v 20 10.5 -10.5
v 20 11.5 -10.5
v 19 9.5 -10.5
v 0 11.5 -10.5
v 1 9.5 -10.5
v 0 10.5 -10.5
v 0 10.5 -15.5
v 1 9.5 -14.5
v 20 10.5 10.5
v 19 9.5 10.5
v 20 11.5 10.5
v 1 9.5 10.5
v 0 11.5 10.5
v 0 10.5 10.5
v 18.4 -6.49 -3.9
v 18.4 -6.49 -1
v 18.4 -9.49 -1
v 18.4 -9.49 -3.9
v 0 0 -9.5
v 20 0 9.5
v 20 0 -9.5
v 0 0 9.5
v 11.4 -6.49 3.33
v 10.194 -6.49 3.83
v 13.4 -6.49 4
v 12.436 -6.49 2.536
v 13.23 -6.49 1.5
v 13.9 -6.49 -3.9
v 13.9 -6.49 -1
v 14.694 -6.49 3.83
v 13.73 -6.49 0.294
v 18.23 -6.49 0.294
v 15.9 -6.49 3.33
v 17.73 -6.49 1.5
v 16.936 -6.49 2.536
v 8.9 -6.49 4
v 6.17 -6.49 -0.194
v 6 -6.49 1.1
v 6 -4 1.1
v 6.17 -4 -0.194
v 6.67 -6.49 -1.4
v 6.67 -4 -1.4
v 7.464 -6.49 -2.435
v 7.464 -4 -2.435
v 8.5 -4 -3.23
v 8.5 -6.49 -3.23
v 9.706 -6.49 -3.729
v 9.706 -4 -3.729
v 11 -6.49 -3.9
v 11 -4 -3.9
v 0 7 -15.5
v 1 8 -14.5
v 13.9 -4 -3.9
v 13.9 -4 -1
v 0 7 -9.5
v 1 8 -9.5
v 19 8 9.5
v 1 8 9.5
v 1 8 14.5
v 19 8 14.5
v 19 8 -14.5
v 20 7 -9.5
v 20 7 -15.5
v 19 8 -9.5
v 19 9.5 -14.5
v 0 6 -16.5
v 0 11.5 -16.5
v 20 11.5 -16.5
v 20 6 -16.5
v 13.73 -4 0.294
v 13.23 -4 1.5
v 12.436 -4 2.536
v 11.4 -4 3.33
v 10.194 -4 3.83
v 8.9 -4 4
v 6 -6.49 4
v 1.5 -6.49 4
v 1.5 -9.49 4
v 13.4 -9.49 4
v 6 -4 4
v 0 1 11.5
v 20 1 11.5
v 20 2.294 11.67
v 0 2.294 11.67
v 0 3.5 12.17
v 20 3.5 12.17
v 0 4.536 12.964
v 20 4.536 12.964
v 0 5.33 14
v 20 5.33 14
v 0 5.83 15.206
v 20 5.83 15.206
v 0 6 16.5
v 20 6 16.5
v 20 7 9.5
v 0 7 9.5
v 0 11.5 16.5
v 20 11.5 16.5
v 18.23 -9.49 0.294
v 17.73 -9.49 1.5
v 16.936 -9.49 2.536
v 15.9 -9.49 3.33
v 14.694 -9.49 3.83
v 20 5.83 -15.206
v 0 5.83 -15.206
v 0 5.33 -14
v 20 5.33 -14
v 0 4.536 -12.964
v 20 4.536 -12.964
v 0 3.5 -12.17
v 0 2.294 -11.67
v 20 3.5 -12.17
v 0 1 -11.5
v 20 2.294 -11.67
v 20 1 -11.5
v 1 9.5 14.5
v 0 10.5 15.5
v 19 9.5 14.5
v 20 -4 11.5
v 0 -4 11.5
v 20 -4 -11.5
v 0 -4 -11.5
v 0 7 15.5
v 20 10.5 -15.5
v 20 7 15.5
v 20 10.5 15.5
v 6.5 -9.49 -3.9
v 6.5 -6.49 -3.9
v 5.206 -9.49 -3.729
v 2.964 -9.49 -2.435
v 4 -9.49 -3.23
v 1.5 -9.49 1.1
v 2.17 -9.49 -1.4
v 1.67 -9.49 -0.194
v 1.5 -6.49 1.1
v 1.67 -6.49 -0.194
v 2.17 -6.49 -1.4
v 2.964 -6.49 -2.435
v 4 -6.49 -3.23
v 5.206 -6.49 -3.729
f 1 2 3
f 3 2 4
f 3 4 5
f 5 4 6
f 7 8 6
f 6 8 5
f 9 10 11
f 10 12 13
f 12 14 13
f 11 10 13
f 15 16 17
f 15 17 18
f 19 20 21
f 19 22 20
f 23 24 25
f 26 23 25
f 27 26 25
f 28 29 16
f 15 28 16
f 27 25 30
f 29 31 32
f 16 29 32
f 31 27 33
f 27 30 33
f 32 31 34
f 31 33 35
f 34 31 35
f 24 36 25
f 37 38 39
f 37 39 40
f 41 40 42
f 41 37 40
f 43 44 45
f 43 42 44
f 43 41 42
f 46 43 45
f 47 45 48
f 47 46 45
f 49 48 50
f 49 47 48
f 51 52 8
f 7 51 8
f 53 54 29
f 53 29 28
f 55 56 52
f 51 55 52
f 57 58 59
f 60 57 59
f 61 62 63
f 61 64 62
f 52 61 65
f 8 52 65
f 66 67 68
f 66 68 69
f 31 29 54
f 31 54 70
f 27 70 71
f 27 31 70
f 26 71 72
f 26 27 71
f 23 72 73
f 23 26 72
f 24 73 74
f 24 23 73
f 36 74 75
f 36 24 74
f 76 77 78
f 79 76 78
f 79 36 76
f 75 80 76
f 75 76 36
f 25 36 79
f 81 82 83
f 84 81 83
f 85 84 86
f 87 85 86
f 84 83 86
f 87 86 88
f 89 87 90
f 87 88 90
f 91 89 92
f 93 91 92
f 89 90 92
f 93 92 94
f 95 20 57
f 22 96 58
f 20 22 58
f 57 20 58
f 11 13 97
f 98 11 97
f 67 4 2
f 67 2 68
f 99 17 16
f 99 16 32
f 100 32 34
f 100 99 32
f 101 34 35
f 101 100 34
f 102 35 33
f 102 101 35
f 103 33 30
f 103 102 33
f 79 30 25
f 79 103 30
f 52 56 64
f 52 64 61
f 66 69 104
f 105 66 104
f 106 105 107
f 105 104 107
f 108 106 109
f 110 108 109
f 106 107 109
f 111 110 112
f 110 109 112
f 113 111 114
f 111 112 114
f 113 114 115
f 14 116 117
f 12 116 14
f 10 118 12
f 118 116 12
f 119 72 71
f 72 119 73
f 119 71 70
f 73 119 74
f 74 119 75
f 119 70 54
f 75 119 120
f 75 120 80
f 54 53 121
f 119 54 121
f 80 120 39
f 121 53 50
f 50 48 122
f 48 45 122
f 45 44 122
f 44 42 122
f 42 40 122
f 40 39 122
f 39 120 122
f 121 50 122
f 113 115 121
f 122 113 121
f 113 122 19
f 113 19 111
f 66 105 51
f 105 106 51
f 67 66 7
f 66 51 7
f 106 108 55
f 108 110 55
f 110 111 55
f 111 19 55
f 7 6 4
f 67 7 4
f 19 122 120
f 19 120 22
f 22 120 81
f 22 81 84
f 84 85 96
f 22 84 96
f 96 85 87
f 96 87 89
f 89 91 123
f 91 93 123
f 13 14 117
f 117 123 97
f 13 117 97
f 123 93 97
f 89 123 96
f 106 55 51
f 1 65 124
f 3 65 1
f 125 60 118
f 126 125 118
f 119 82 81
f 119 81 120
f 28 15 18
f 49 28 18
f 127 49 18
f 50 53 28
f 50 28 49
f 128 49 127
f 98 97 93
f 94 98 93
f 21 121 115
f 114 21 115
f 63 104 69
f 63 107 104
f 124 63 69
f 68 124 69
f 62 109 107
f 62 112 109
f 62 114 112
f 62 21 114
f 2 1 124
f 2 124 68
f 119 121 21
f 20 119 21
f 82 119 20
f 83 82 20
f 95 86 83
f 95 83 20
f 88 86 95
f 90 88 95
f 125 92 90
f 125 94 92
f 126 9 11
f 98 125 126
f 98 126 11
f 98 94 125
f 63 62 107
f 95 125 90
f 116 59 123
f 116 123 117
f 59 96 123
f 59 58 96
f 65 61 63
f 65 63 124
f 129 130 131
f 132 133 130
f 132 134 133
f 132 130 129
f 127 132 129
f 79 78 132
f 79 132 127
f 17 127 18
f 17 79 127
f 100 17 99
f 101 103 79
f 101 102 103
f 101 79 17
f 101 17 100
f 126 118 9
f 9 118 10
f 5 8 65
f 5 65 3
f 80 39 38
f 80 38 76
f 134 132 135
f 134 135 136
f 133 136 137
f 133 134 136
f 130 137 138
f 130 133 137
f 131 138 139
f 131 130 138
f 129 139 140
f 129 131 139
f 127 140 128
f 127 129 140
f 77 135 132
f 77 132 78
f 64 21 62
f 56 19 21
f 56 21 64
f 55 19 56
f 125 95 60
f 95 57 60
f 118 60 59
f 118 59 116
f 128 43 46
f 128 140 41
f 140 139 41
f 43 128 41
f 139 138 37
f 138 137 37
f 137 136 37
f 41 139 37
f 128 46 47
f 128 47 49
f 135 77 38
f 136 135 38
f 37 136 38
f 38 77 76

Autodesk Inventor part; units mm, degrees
ref_plane "YZ Plane" through (0, 0, 0) normal (1, 0, 0) x (0, 1, 0)
ref_plane "XZ Plane" through (0, 0, 0) normal (0, 1, 0) x (-1, 0, 0)
ref_plane "XY Plane" through (0, 0, 0) normal (0, 0, 1) x (1, 0, 0)
sketch "Sketch1" plane through (0, 0, 0) normal (1, 0, 0) x (0, 1, 0)
  line L0 (0, 9.5) -> (0, -9.5)
  line L1 (0, -9.5) -> (8, -9.5)
  line L2 (0, 9.5) -> (8, 9.5)
  line L3 (8, 9.5) -> (8, 14.5)
  line L4 (8, 14.5) -> (9.5, 14.5)
  line L5 (9.5, 14.5) -> (9.5, 10.5)
  line L6 (9.5, 10.5) -> (11.5, 10.5)
  line L7 (11.5, 10.5) -> (11.5, 16.5)
  line L8 (11.5, 16.5) -> (6, 16.5)
  line L9 (6, 16.5) -> (6, 11.5)
  line L10 (6, 11.5) -> (-3, 11.5)
  line L11 (-3, 11.5) -> (-4, 11.5)
  line L12 (-4, 11.5) -> (-4, 1)
  line L13 (0, 0) -> (3.5, 0)
  line L14 (0, -9.5) -> (8, -9.5)
  line L15 (8, -9.5) -> (8, -14.5)
  line L16 (8, -14.5) -> (9.5, -14.5)
  line L17 (9.5, -14.5) -> (9.5, -10.5)
  line L18 (11.5, -10.5) -> (11.5, -16.5)
  line L19 (11.5, -16.5) -> (6, -16.5)
  line L20 (6, -16.5) -> (6, -11.5)
  line L21 (6, -11.5) -> (-3, -11.5)
  line L22 (-3, -11.5) -> (-4, -11.5)
  line L23 (-4, -11.5) -> (-4, 1)
  line L24 (11.5, -10.5) -> (9.5, -10.5)
  point P0 (8.75, -16.5)
  point P1 (8.75, -14.5)
  dimension "d0" = 19
  dimension "d1" = 0
  dimension "d2" = 8
  dimension "d3" = 8
  dimension "d4" = 5
  dimension "d5" = 1.5
  dimension "d6" = 2
  dimension "d7" = 6
  dimension "d8" = 5.5
  dimension "d9" = 5
  dimension "d10" = 1
  dimension "d13" = 2
  dimension "d14" = 4
extrude "Extrusion1" add sketch "Sketch1" along normal blind 20
fillet "Fillet1" radius 5 2 edges at (10, 6, -11.5) (10, 6, 11.5)
chamfer "Chamfer1" distance 1 angle 45 12 edges at (20, 8, -12) (20, 8.75, -14.5) (20, 9.5, -12.5) (20, 8, 12) (20, 8.75, 14.5) (20, 9.5, 12.5) (0, 8, -12) (0, 8.75, -14.5) (0, 9.5, -12.5) (0, 8, 12) (0, 8.75, 14.5) (0, 9.5, 12.5)
sketch "Sketch3" plane through (0, -4, -11.5) normal (0, -1, 0) x (1, 0, 0)
  line L0 (6, 15.5002) -> (13.9, 15.5002)
  line L1 (13.9, 15.5002) -> (13.9, 7.6002)
  line L2 (13.9, 7.6002) -> (6, 7.6002)
  line L3 (6, 7.6002) -> (6, 15.5002)
  line L4 (0, 23) -> (0, 0) projected
  line L5 (0, 23) -> (20, 23) projected
  point P0 (0, 11.5)
  point P1 (10, 23)
  point P2 (9.95, 15.5002)
  dimension "d27" = 7.9
  dimension "d28" = 7.9
  dimension "d29" = 6
  dimension "d30" = 7.5
extrude "Extrusion3" add sketch "Sketch3" along normal blind 2.49
sketch "Sketch4" plane through (0, -6.49, -11.5) normal (0, -1, 0) x (1, 0, 0)
  line L0 (1.5, 15.5002) -> (18.4, 15.5002)
  line L1 (18.4, 15.5002) -> (18.4, 7.6002)
  line L2 (18.4, 7.6002) -> (1.5, 7.6002)
  line L3 (1.5, 7.6002) -> (1.5, 15.5002)
  line L4 (1.5, 15.5002) -> (18.4, 7.6002) construction
  line L5 (18.4, 15.5002) -> (1.5, 7.6002) construction
  line L6 (6, 7.6002) -> (13.9, 7.6002) projected
  line L7 (13.9, 7.6002) -> (13.9, 15.5002) projected
  point P0 (0, 11.5)
  point P1 (9.95, 11.5502)
  dimension "d33" = 16.9
  dimension "d34" = 7.9
  dimension "d35" = 0
  dimension "d36" = 4.5
extrude "Extrusion4" add sketch "Sketch4" along normal blind 3
fillet "Fillet2" radius 5 4 edges at (6, -5.245, -3.8998) (1.5, -7.99, -3.8998) (13.9, -5.245, 4.0002) (18.4, -7.99, 4.0002)
sketch "Sketch2" plane through (0, 0, 9.5) normal (0, 1, 0) x (1, 0, 0)
  circle A0 centre (10, 9.5) radius 3
  line L0 (20, 19) -> (20, 0) projected
  line L1 (0, -7) -> (20, -7) projected
  point P0 (0, 9.5)
  dimension "d19" = 6
  dimension "d20" = 10
  dimension "d21" = 16.5
properties part number "Drziak_3"
